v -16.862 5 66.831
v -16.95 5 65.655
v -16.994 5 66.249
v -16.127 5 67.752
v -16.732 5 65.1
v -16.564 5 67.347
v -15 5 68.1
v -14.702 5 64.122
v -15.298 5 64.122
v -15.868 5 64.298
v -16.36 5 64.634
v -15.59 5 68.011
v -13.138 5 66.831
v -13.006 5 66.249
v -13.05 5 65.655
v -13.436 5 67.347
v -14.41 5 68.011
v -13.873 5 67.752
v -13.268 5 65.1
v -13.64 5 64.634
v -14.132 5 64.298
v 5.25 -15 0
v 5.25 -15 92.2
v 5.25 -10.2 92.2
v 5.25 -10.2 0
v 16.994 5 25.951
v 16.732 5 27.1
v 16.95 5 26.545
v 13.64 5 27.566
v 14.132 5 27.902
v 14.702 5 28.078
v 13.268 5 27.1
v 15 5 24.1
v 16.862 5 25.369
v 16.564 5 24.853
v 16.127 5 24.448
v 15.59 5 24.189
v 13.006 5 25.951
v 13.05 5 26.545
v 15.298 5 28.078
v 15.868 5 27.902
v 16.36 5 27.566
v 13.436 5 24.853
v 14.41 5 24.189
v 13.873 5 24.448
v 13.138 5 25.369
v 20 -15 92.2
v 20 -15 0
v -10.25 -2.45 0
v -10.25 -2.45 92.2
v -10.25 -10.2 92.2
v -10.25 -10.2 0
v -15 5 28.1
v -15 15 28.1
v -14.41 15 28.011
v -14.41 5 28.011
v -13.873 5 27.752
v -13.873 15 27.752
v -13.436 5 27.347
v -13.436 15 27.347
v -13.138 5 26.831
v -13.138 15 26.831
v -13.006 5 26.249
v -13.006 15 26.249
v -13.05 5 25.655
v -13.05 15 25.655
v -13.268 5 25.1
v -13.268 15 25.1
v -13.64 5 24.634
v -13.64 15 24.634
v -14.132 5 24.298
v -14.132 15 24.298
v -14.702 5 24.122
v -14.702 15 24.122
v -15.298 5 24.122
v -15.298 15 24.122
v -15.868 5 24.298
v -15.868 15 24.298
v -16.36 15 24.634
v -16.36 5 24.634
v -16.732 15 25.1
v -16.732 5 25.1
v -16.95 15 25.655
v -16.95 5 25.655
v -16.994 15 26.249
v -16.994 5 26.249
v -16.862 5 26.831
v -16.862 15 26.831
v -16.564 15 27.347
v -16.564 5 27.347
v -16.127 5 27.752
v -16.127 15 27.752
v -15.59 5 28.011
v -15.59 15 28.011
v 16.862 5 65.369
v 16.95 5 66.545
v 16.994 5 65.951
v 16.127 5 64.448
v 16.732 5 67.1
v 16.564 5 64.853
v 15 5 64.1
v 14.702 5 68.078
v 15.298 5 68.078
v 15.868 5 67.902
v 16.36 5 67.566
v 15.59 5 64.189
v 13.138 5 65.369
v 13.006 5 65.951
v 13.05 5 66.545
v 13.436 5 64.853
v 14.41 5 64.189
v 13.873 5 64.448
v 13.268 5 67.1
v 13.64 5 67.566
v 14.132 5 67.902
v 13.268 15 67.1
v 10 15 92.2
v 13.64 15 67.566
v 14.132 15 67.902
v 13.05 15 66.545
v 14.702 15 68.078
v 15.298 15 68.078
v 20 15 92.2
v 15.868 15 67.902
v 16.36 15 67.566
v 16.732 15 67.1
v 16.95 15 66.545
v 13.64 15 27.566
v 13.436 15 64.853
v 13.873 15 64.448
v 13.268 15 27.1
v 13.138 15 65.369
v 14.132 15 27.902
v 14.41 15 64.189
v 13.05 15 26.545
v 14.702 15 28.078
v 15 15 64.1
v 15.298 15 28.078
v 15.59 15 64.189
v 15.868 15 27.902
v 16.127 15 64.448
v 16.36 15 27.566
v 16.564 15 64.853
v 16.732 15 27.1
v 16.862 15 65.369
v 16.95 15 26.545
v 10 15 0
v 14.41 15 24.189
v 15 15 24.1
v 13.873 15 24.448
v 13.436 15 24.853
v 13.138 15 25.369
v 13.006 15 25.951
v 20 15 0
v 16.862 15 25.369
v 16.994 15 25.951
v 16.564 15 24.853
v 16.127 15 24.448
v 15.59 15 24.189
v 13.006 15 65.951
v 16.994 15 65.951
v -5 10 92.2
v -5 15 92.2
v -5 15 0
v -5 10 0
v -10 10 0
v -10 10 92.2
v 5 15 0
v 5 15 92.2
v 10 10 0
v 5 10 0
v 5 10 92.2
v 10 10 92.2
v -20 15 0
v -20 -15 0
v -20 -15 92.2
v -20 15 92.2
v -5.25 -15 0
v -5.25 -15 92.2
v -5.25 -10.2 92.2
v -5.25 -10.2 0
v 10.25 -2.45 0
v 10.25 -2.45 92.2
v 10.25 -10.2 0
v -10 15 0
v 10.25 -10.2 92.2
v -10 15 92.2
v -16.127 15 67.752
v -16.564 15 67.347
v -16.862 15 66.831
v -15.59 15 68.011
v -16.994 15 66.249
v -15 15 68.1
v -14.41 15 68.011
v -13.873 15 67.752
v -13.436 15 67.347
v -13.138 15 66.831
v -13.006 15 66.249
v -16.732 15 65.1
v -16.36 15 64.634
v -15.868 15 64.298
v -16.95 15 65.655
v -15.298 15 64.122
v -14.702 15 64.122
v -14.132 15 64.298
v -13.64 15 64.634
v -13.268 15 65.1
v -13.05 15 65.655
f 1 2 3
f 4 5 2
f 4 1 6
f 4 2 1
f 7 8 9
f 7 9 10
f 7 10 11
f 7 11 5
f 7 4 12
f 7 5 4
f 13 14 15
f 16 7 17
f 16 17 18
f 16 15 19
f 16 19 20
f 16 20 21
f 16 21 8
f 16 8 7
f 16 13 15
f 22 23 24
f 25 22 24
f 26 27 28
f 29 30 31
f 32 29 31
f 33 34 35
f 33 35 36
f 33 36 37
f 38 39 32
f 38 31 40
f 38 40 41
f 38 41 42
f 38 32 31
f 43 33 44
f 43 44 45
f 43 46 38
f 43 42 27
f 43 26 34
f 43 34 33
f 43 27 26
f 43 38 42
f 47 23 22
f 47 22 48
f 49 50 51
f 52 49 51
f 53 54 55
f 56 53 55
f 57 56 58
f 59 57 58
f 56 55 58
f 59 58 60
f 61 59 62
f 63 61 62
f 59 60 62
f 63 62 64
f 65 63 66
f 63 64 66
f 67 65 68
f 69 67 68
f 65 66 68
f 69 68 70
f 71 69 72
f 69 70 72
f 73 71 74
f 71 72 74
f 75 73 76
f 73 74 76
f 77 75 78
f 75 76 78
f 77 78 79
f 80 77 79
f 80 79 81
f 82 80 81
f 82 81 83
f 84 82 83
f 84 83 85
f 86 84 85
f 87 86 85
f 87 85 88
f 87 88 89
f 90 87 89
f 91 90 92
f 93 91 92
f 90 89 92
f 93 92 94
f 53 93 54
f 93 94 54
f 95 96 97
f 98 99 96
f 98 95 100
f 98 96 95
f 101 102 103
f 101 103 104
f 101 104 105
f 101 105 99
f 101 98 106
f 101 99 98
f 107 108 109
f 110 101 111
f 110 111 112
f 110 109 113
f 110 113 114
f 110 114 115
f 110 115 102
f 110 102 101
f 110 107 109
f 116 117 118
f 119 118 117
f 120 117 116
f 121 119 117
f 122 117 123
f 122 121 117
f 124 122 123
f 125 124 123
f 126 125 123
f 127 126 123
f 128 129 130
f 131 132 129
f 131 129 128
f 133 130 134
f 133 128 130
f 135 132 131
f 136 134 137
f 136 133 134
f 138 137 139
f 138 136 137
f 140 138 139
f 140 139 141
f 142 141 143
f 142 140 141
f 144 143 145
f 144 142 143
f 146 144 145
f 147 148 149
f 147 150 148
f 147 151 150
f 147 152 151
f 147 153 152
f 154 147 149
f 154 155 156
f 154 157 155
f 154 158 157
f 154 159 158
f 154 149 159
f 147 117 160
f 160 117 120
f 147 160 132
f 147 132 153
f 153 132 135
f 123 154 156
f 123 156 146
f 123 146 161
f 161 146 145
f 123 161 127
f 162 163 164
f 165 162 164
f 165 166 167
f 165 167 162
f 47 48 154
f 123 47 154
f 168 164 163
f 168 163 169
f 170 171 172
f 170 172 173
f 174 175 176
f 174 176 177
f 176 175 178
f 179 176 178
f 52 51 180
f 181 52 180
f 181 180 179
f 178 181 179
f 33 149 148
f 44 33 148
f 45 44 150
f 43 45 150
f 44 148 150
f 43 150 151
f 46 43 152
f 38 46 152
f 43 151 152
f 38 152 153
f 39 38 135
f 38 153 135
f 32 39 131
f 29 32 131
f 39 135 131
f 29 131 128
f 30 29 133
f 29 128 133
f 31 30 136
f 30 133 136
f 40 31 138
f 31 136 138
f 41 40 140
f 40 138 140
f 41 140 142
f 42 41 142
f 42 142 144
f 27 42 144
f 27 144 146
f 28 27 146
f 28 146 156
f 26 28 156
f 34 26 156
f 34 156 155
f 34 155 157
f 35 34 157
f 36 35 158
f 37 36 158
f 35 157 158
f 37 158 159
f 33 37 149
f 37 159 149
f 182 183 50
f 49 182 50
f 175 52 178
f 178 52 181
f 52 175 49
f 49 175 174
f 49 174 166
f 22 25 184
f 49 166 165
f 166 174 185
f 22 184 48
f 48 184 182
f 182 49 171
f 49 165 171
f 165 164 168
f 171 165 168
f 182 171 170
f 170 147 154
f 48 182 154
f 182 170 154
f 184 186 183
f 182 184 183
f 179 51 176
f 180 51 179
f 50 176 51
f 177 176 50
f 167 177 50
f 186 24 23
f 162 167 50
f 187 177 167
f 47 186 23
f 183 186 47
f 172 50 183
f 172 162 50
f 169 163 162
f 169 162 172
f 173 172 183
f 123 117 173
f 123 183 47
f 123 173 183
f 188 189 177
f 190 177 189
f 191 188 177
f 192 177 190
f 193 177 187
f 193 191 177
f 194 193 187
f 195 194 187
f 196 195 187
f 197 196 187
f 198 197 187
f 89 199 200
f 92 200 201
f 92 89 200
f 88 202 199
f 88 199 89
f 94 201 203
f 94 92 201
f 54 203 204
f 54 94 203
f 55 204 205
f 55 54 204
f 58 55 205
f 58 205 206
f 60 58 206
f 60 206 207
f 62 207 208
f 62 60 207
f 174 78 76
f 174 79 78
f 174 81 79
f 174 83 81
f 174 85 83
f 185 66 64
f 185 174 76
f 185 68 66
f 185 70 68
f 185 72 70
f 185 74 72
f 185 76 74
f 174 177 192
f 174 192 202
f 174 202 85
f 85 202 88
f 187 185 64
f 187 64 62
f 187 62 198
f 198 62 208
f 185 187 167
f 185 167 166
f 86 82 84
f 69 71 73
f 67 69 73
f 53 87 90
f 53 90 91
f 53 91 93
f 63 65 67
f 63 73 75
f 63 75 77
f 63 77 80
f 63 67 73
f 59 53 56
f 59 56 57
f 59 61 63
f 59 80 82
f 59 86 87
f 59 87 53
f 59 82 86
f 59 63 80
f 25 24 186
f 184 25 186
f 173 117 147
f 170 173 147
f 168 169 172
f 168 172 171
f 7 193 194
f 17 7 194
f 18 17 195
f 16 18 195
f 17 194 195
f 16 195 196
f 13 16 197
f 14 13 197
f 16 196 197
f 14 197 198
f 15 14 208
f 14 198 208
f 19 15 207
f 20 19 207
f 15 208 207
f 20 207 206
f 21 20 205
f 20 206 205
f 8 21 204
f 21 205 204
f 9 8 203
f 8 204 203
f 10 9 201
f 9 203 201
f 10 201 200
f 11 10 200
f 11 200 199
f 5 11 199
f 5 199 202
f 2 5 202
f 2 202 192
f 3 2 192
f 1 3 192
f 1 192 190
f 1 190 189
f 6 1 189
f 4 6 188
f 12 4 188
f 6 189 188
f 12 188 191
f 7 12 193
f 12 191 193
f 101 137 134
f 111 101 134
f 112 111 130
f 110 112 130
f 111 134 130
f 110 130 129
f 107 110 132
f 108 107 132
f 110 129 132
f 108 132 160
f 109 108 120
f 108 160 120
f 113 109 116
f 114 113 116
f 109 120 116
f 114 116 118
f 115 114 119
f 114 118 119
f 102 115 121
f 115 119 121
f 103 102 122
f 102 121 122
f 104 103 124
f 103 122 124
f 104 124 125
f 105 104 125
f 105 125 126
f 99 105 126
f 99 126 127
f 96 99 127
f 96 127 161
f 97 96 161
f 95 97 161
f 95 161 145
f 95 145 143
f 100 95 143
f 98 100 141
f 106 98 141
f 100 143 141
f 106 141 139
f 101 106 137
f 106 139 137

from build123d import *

# Parameters (mm, degrees)
CROQUIS1_W              = 40
CROQUIS1_H              = 30
SALIENTE_EXTRUIR1_DEPTH = 92.2
CORTAR_EXTRUIR1_DEPTH   = 96.529262532
CROQUIS3_W              = 5
CROQUIS3_H              = 92.2
CORTAR_EXTRUIR2_DEPTH   = 5
CROQUIS4_R              = 2
CORTAR_EXTRUIR3_DEPTH   = 10


with BuildPart() as part:
    # Croquis1 → Saliente-Extruir1 (new body)
    with BuildSketch(Plane.XY):
        Rectangle(CROQUIS1_W, CROQUIS1_H)
    extrude(amount=SALIENTE_EXTRUIR1_DEPTH)

    # Croquis2 → Cortar-Extruir1 (cut, through all)
    with BuildSketch(Plane.XY.offset(92.2)):
        Polygon((-10.25, -2.45), (-10.25, -10.2), (-5.25, -10.2), (-5.25, -15), (5.25, -15), (5.25, -10.2), (10.25, -10.2), (10.25, -2.45), align=None)
    extrude(amount=-CORTAR_EXTRUIR1_DEPTH, mode=Mode.SUBTRACT)

    # Croquis3 → Cortar-Extruir2 (cut)
    with BuildSketch(Plane(origin=(0, 15, 0), x_dir=(1, 0, 0), z_dir=(0, 1, 0))):
        with Locations((-7.5, -46.1)):
            Rectangle(CROQUIS3_W, CROQUIS3_H)
        with Locations((7.5, -46.1)):
            Rectangle(CROQUIS3_W, CROQUIS3_H)
    extrude(amount=-CORTAR_EXTRUIR2_DEPTH, mode=Mode.SUBTRACT)

    # Croquis4 → Cortar-Extruir3 (cut)
    with BuildSketch(Plane(origin=(0, 15, 0), x_dir=(1, 0, 0), z_dir=(0, 1, 0))):
        with Locations(Location((-15, -26.1, 0), (0, 0, 270))):
            Circle(CROQUIS4_R)
        with Locations(Location((-15, -66.1, 0), (0, 0, 270))):
            Circle(CROQUIS4_R)
        with Locations(Location((15, -66.1, 0), (0, 0, 90))):
            Circle(CROQUIS4_R)
        with Locations(Location((15, -26.1, 0), (0, 0, 90))):
            Circle(CROQUIS4_R)
    extrude(amount=-CORTAR_EXTRUIR3_DEPTH, mode=Mode.SUBTRACT)


solid = part.part
